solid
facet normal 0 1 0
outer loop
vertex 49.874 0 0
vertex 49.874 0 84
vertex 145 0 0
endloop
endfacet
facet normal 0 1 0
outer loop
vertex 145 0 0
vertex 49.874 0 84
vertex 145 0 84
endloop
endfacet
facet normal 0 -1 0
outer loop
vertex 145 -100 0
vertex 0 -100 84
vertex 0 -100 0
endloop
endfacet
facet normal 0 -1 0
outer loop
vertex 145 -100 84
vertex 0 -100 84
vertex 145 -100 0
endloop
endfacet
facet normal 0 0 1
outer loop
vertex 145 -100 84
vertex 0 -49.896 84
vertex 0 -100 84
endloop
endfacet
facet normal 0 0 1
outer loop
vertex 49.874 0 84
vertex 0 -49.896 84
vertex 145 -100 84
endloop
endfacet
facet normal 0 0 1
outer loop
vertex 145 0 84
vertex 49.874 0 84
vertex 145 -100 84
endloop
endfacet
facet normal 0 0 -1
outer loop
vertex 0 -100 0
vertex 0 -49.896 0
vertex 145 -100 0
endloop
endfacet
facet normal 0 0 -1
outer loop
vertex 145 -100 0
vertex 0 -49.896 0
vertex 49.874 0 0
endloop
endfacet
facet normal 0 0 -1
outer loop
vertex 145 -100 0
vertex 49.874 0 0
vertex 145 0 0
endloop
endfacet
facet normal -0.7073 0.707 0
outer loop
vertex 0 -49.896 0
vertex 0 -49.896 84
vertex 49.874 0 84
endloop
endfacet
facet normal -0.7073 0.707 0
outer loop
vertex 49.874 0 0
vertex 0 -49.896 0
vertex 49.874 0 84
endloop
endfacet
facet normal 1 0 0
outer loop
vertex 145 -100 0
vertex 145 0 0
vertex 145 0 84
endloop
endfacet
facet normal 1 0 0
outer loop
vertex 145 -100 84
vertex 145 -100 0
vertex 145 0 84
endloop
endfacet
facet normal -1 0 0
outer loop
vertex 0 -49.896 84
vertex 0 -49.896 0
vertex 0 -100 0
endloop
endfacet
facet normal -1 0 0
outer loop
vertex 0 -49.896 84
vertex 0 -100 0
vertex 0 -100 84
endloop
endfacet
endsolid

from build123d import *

# Parameters (mm, degrees)
F0_W      = 43.9760684967
F0_H      = 38.9796495438
F1_DEPTH  = 145
F2_DEPTH  = 145
F3_DEPTH  = 84
F4_W      = 44.016815722
F4_H      = 37.3572036624
F5_DEPTH  = 10
F6_DEPTH  = 50
F8_DEPTH  = 50
F11_DEPTH = 84
F13_DEPTH = 45


with BuildPart() as f1:
    # F0 (on Front) → F1 (new body)
    with BuildSketch(Plane.XZ):
        with Locations((21.9880342484, 19.4898247719)):
            Rectangle(F0_W, F0_H)
    extrude(amount=F1_DEPTH)

    # F2 (add): a face of the model
    f2_faces = [f1.faces().sort_by_distance(p)[0] for p in [
        (0, -72.5, 19.4898247719),
    ]]
    extrude(f2_faces, amount=-F2_DEPTH)

    # F3 (add): a face of the model
    f3_faces = [f1.faces().sort_by_distance(p)[0] for p in [
        (72.5, -72.5, 0),
    ]]
    extrude(f3_faces, amount=-F3_DEPTH)

    # F10 (on face) → F11 (cut)
    with BuildSketch(Plane.XY.offset(84)):
        Polygon((0, -49.8955249786), (49.8742908239, 0), (0, 0), align=None)
    extrude(amount=-F11_DEPTH, mode=Mode.SUBTRACT)

    # F13 (cut): a face of the model
    f13_faces = [f1.faces().sort_by_distance(p)[0] for p in [
        (72.5, -145, 42),
    ]]
    extrude(f13_faces, amount=-F13_DEPTH, mode=Mode.SUBTRACT)


with BuildPart() as f5:
    # F4 (on face) → F5 (new body)
    with BuildSketch(Plane.XY.offset(84)):
        with Locations((22.008407861, -18.6786018312)):
            Rectangle(F4_W, F4_H)
    extrude(amount=F5_DEPTH)


with BuildPart() as f6:
    # F6 (new): a face of the model
    f6_faces = [f5.part.faces().sort_by_distance(p)[0] for p in [
        (22.008407861, 0, 89),
    ]]
    extrude(f6_faces, amount=-F6_DEPTH)


with BuildPart() as f8:
    # F8 (new): a face of the model
    f8_faces = [f6.part.faces().sort_by_distance(p)[0] for p in [
        (0, -25, 89),
    ]]
    extrude(f8_faces, amount=-F8_DEPTH)


solid = f1.part
